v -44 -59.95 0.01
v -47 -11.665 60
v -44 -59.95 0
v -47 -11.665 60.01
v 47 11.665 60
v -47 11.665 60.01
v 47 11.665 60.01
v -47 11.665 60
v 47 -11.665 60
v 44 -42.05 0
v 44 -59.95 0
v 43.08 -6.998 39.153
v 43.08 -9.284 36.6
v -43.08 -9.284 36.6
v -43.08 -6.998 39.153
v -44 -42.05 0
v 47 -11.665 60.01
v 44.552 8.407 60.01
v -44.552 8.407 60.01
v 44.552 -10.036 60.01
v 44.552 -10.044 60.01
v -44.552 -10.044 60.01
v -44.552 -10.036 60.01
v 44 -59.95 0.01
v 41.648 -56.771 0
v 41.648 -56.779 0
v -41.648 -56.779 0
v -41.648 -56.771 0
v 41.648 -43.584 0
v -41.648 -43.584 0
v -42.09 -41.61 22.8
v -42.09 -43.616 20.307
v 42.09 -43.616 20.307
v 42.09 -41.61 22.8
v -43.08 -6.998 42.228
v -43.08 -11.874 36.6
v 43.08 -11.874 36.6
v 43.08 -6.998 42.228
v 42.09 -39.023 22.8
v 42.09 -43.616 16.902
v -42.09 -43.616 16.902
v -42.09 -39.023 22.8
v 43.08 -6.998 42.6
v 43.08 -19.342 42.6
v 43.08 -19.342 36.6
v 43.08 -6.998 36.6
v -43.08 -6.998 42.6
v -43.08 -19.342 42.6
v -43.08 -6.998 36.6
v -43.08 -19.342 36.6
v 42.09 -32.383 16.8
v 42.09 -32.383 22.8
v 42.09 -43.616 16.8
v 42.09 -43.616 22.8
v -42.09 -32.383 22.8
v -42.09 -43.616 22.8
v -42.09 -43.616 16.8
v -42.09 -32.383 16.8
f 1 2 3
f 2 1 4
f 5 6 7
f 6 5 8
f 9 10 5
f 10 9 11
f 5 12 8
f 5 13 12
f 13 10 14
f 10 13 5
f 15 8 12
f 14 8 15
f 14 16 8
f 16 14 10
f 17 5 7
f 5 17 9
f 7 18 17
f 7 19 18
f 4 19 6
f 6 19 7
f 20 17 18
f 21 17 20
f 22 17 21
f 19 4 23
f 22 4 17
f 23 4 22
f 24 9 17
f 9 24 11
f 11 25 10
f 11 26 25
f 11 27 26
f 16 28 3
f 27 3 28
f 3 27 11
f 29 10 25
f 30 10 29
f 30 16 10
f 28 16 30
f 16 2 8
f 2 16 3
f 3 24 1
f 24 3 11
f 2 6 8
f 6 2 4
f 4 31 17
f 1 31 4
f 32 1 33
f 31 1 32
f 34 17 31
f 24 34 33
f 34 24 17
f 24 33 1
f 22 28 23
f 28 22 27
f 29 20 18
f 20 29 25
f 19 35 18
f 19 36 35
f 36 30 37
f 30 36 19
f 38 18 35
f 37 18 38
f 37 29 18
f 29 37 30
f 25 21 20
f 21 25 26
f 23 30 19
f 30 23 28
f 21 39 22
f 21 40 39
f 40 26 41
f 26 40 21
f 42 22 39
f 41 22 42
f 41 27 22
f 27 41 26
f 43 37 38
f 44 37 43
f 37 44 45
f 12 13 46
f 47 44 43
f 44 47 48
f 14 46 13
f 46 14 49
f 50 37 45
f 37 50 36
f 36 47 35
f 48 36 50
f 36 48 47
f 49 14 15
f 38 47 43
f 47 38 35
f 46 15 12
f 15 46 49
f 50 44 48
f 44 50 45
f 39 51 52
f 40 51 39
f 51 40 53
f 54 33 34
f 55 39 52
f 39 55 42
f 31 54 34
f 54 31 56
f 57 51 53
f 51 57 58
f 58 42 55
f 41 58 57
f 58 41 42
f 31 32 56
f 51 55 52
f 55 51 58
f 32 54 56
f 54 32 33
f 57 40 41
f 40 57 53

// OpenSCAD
// Scivolo di scarico — stampa 1x. Si fissa sotto l'apertura di scarico
// dell'housing e incanala la sigaretta singola verso il pannello frontale,
// spostandosi in orizzontale di `chute_dy` (params.scad) per raggiungerlo:
// il mobile mette la tramoggia/housing al centro e il pannello vicino al
// fronte, quindi lo scivolo è un condotto obliquo, non dritto.
include <params.scad>

module loft(w1, d1, w2, d2, h, dy2 = 0) {
    hull() {
        translate([0, 0, h]) linear_extrude(0.01) square([w1, d1], center = true);
        translate([0, -dy2, 0]) linear_extrude(0.01) square([w2, d2], center = true);
    }
}

id_top    = max(drop_d1 - 2*hopper_wall, 4);
id_bottom = max(drop_d2 - 2*hopper_wall, 4);
iw_top    = drop_w - 2*hopper_wall;
iw_bottom = drop_w - 6 - 2*hopper_wall;

function lerp(a, b, t) = a + (b - a) * t;

// Sbarramento anti-intrusione: due alette sfalsate (una da un lato, una
// dall'altro) impediscono a una mano infilata dalla feritoia del pannello
// di raggiungere in linea retta il rullo, sullo stesso principio di una
// buca delle lettere o di una cassaforte con imbuto a zig-zag. La
// sigaretta (piccola, cade tumbling) passa lo stesso dallo spazio lasciato
// libero sul lato opposto.
// centro (in Y) della sezione del condotto all'altezza z0 — il condotto è
// obliquo (vedi loft/dy2), quindi non è fisso a Y=0 come prima
function center_y(z0) = lerp(-chute_dy, 0, z0 / drop_h);

module baffle(z0, side, cover_frac, thick, overlap = 2) {
    t = z0 / drop_h;
    d = lerp(id_bottom, id_top, t);
    w = lerp(iw_bottom, iw_top, t) - 1; // piccolo gioco dalle pareti
    cov = d * cover_frac;
    // il bordo esterno affonda `overlap` nella parete (unione solida,
    // non tangente) — lo stesso accorgimento usato altrove per evitare
    // mesh non manifold da superfici coincidenti
    y_far  = center_y(z0) + side * (d/2 + overlap);
    y_near = center_y(z0) + side * (d/2 - cov);
    translate([0, (y_far + y_near) / 2, z0])
        cube([w, abs(y_far - y_near), thick], center = true);
}

module chute() {
    union() {
        difference() {
            loft(drop_w, drop_d1, drop_w - 6, drop_d2, drop_h, chute_dy);
            translate([0, 0, -1])
                loft(iw_top, id_top, iw_bottom, id_bottom, drop_h + 2, chute_dy);
        }
        // le alette si aggiungono DOPO aver scavato la cavità, altrimenti
        // la sottrazione le rimuoverebbe (sono dimensionate per stare
        // proprio dentro quello spazio cavo)
        baffle(drop_h * 0.66, 1, 0.62, 6);
        baffle(drop_h * 0.33, -1, 0.62, 6);
    }
}

chute();
